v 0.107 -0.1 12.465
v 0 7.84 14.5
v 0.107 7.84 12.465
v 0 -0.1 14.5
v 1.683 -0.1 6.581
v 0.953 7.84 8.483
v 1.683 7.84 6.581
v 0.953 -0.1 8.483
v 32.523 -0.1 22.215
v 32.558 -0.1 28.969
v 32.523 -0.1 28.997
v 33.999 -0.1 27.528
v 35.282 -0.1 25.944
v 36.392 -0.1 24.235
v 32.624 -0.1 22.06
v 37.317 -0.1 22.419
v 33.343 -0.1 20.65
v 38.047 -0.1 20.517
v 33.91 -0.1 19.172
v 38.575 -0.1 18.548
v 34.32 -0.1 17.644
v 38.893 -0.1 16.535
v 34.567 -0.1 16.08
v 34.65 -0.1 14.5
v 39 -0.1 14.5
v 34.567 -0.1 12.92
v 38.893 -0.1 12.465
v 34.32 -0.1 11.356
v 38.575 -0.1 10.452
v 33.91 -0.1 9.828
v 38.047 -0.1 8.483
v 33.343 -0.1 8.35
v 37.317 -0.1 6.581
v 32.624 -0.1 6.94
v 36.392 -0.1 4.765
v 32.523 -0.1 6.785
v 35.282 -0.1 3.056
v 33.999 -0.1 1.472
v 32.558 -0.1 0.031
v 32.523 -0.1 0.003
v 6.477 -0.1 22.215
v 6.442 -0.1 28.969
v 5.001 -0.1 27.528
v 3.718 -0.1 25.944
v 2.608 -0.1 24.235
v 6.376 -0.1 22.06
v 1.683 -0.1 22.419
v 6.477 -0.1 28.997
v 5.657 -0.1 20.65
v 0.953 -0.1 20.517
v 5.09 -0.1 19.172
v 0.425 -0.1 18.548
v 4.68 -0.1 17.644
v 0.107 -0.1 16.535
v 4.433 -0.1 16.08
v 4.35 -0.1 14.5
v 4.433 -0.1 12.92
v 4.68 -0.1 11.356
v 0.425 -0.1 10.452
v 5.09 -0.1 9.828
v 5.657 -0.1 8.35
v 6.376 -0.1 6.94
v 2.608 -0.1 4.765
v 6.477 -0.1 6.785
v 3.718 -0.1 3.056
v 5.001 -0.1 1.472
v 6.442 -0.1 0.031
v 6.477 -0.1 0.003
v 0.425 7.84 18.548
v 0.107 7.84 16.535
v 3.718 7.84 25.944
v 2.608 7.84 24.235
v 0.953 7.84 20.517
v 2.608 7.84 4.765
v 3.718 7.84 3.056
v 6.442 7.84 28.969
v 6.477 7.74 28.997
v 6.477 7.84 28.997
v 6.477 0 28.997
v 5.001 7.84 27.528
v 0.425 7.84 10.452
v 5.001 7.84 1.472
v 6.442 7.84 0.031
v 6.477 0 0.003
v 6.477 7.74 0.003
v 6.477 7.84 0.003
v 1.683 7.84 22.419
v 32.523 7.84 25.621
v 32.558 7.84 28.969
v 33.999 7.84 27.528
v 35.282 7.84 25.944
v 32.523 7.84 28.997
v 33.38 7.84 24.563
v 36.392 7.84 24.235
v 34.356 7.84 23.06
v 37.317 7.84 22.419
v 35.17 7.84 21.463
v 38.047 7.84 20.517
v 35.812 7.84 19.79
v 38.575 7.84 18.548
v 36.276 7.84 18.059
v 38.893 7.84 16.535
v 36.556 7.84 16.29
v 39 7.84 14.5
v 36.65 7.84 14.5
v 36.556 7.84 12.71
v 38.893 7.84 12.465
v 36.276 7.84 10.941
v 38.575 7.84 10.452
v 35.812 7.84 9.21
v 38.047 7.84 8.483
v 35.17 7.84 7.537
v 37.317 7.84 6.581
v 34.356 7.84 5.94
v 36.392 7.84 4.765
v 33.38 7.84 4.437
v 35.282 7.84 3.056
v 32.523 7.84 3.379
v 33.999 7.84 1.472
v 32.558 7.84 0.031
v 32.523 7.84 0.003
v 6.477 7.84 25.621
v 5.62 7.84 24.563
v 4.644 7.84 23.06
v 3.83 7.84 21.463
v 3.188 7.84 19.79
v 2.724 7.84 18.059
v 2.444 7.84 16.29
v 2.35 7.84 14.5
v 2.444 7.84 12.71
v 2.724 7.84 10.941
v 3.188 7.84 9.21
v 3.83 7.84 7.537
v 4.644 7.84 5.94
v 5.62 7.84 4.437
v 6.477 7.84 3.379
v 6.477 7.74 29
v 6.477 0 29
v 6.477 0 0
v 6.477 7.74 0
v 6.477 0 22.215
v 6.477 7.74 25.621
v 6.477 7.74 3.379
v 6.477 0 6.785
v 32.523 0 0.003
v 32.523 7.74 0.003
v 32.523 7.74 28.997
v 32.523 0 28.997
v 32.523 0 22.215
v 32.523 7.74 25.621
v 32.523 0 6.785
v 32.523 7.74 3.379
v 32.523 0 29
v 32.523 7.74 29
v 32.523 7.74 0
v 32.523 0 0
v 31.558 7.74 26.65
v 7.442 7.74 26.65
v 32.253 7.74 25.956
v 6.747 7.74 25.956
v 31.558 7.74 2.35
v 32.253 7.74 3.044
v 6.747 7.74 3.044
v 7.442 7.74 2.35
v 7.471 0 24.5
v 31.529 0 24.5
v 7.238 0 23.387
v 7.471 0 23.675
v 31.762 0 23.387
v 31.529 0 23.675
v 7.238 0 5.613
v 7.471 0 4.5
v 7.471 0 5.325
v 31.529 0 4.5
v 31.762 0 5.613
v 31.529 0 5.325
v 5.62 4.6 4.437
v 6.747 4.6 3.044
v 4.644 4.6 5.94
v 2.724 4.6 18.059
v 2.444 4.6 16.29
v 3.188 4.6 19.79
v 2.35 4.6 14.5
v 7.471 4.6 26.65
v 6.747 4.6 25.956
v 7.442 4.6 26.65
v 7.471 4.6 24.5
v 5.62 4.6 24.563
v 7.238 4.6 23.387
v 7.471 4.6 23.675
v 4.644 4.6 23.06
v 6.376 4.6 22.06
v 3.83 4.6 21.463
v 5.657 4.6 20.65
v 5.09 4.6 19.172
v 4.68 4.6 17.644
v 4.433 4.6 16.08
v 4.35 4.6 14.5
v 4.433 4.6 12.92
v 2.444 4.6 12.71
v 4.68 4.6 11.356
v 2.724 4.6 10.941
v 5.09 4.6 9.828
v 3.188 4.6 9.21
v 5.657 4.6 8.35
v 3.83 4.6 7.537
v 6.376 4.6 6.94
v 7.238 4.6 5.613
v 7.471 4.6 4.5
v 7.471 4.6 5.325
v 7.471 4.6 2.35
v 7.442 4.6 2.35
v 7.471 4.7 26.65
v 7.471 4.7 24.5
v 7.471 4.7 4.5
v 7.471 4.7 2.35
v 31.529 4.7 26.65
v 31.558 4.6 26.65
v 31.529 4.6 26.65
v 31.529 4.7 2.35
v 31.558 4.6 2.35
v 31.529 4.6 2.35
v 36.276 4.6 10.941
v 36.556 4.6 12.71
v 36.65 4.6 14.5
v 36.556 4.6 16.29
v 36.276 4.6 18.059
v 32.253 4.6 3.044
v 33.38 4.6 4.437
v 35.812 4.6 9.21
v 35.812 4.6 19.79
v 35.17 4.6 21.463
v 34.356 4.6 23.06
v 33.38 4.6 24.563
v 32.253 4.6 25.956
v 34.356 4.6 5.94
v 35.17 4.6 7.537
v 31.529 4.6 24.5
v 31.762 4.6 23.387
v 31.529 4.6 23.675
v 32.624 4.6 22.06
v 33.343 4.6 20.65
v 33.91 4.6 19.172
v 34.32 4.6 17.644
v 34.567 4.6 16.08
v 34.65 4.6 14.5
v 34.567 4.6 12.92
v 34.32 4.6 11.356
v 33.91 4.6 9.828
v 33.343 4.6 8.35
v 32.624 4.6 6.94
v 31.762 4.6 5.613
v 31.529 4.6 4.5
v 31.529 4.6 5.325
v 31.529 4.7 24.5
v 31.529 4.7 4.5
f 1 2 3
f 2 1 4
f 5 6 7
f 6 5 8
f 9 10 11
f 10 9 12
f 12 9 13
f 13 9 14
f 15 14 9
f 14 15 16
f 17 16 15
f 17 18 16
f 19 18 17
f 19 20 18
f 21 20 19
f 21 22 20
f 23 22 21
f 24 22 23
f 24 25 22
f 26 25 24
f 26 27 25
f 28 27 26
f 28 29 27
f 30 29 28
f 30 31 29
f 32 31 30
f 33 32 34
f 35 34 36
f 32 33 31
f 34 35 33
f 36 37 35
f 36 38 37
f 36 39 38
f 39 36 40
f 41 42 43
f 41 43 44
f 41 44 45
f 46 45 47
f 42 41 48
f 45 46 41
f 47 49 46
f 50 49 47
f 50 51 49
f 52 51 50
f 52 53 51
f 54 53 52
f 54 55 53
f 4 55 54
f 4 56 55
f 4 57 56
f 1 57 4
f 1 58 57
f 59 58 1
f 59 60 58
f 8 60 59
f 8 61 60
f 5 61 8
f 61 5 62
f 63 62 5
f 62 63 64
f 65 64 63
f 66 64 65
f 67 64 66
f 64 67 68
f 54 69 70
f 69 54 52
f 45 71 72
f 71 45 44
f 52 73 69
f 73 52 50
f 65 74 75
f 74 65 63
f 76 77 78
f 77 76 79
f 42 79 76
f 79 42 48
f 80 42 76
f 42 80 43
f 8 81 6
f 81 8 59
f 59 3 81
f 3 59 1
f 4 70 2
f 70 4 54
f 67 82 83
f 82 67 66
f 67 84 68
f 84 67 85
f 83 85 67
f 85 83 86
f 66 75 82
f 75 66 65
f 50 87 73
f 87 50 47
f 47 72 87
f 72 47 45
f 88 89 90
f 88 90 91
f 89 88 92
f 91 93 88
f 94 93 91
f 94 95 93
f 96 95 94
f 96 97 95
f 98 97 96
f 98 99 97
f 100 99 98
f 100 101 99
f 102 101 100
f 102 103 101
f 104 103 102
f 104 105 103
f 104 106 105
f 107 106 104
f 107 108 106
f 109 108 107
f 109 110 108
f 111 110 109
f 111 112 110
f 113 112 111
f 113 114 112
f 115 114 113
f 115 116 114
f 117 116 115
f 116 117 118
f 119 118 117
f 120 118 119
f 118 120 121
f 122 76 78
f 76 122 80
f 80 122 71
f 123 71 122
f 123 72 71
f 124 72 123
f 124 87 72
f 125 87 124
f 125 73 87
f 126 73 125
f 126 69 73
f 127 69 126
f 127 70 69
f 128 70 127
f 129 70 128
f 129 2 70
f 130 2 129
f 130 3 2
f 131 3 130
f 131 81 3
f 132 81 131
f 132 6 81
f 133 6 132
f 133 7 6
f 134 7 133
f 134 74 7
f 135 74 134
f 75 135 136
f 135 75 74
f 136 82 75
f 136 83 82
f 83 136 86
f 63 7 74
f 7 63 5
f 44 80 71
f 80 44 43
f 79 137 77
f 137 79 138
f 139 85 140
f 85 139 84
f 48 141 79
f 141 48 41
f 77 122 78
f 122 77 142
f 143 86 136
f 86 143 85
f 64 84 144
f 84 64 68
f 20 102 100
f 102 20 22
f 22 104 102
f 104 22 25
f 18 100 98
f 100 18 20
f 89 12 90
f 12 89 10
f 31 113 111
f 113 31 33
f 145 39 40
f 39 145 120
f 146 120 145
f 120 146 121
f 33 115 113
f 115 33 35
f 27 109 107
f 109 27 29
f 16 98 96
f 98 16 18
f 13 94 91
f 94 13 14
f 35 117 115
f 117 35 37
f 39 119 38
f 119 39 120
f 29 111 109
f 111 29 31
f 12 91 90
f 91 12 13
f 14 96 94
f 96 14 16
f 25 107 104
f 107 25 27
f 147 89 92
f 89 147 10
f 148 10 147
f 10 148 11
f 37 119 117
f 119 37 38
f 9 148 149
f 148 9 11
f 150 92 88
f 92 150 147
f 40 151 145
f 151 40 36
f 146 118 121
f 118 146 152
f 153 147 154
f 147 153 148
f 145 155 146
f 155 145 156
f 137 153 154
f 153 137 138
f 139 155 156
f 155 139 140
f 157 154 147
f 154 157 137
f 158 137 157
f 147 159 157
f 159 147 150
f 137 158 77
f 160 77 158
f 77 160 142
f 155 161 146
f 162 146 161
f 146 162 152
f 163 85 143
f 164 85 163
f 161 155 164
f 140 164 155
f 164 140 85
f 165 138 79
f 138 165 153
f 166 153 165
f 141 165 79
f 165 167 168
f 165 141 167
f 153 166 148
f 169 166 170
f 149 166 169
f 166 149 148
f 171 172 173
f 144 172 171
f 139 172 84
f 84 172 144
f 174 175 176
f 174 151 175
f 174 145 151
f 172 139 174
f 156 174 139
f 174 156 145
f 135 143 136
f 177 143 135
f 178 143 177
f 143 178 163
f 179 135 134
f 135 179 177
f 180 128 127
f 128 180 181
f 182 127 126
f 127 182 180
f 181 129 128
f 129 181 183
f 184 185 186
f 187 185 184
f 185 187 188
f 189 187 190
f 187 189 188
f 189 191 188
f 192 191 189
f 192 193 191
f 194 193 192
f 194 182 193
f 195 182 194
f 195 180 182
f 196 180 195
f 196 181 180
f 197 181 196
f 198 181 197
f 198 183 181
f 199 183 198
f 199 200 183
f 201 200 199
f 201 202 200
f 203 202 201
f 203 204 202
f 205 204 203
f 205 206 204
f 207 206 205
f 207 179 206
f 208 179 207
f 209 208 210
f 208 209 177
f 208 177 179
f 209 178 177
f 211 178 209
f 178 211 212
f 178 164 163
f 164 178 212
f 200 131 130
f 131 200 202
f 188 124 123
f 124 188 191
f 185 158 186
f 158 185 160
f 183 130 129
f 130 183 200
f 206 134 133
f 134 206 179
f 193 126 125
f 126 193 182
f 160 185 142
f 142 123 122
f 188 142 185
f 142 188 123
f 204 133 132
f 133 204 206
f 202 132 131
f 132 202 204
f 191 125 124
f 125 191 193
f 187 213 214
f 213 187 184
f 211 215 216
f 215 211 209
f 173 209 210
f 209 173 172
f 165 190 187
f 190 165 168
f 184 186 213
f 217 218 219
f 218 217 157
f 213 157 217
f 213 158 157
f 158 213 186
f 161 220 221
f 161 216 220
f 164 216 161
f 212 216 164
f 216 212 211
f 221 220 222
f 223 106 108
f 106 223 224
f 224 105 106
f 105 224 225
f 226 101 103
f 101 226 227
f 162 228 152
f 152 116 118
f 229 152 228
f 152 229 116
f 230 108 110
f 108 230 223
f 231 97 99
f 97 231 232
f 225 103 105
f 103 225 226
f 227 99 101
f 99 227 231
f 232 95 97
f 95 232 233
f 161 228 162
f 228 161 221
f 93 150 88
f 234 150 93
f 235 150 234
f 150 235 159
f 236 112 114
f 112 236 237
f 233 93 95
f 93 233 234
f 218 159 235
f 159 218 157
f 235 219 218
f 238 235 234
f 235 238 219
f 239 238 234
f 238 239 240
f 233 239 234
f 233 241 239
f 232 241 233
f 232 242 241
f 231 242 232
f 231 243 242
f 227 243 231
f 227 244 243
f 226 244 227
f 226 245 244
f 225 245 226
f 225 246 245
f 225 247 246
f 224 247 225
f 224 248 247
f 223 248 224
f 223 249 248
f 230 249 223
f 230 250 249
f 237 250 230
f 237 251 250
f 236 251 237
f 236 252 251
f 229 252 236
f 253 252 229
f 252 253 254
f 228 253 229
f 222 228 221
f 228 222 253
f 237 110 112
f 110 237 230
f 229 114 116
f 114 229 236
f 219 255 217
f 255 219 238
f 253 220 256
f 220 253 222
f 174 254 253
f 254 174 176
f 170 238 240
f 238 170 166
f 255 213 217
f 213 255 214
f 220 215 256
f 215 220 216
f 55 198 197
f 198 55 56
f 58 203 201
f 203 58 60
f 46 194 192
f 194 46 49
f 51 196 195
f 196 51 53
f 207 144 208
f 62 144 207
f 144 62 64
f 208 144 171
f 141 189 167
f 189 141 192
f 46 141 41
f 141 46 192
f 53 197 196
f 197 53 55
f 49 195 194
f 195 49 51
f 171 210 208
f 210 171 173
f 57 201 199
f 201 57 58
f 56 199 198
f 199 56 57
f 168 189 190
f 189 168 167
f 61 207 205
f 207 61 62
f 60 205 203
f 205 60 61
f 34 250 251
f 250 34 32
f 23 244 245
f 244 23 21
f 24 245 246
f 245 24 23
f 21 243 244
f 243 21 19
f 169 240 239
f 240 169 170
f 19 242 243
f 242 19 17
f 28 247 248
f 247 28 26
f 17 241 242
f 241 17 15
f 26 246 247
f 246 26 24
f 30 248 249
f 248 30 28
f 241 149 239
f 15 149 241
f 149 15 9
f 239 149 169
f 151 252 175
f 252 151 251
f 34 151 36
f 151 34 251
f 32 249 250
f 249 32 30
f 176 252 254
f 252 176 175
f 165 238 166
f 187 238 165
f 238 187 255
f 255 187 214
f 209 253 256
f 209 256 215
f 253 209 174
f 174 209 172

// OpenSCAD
// ============================================================
// Lens frame — combiner-glass holder + tilted mount
//
//   lens_frame(lens, wall, clearance)      the glass-holder shell: a straight
//                          middle section with an arc cap on each end, minus
//                          the glass pocket + see-through window.
//   lens_negatives(lens, wall, clearance)  the pocket + window as negative
//                          solids in frame-local coords; shared by the frame
//                          and the connecting webs so nothing intrudes on the
//                          lens seat.
//   glass_frame_mount(...)  places the frame tilted at `angle`, bridged to the
//                          shroud side walls by two rear-only connecting webs.
//
// lens = [w, h, t, top_r, lip].  Landscape orientation: lens_h (h) along X,
// lens_w (w) along Z; arc caps on the LEFT/RIGHT ends span lens_w.  Glass
// slides in from the +Y (front) face; the −Y side carries the retaining lip.
// ============================================================

// Frame outer dims derived from the lens block + wall (shared with the
// assembly so the same formulas are never duplicated).
function lens_frame_width(lens, wall) = lens[1] + 2 * wall; // arm_w
function lens_frame_depth(lens, wall) = lens[2] + 2 * wall; // frame_y (glass normal)
function lens_frame_height(lens, wall) = lens[0] + 2 * wall; // frame_z (along tilt)

module lens_frame(lens, wall, clearance) {
  lw = lens[0];
  lh = lens[1];
  ltr = lens[3];
  frame_y = lens_frame_depth(lens, wall);
  frame_z = lens_frame_height(lens, wall);

  // inner pocket arc centres (X, Z) in frame local coords
  inner_hc = sqrt(ltr * ltr - (lw / 2) * (lw / 2)); // half-chord spanning Z = lens_w
  p_lcx = wall + ltr;
  p_rcx = wall + lh - ltr;
  p_cz = wall + lw / 2;

  // inner straight-section X bounds (arc tangent to Z=wall / Z=wall+lens_w)
  inner_lx = p_lcx - inner_hc;
  inner_rx = p_rcx + inner_hc;

  // outer shell (R_outer = lens_top_r + wall)
  R_outer = ltr + wall;
  outer_hc = sqrt(R_outer * R_outer - (frame_z / 2) * (frame_z / 2));
  outer_lx = p_lcx - outer_hc;
  outer_rx = p_rcx + outer_hc;

  difference() {
    // ── outer shell ───────────────────────────────────────────
    union() {
      // straight middle section
      translate([outer_lx, 0, 0])
        cube([outer_rx - outer_lx, frame_y, frame_z]);

      // left arc cap (X < outer_lx)
      intersection() {
        translate([p_lcx, frame_y / 2, p_cz])
          rotate([90, 0, 0])
            cylinder(r=R_outer, h=frame_y + 0.2, center=true, $fn=60);
        translate([-(R_outer + 1), -0.1, -0.1])
          cube([R_outer + 1 + outer_lx, frame_y + 0.2, frame_z + 0.2]);
      }

      // right arc cap (X > outer_rx)
      intersection() {
        translate([p_rcx, frame_y / 2, p_cz])
          rotate([90, 0, 0])
            cylinder(r=R_outer, h=frame_y + 0.2, center=true, $fn=60);
        translate([outer_rx, -0.1, -0.1])
          cube([R_outer + 1, frame_y + 0.2, frame_z + 0.2]);
      }
    }

    // Glass pocket + see-through window cavities (shared with the side webs).
    lens_negatives(lens, wall, clearance);
  }
}

// The glass pocket (opens at +Y) and the see-through window, as a set of
// negative solids in lens_frame local coords.  Cut from the frame AND from
// the connecting webs so nothing intrudes into the lens seat.
module lens_negatives(lens, wall, clearance) {
  lens_pocket(lens, wall, clearance);
  lens_window(lens, wall, clearance);
}

// The glass pocket alone — the stadium prism the lens actually occupies, open
// at the +Y face.  Split out from lens_negatives() so the insertion channel
// can sweep it without dragging the see-through window along.
module lens_pocket(lens, wall, clearance) {
  lw = lens[0];
  lh = lens[1];
  lt = lens[2];
  ltr = lens[3];
  frame_y = lens_frame_depth(lens, wall);

  inner_hc = sqrt(ltr * ltr - (lw / 2) * (lw / 2));
  p_lcx = wall + ltr;
  p_rcx = wall + lh - ltr;
  p_cz = wall + lw / 2;
  p_r = ltr + clearance / 2;
  inner_lx = p_lcx - inner_hc;
  inner_rx = p_rcx + inner_hc;

  // Glass enters from the FRONT (+Y) face; retaining lip on the -Y side.
  pkt = lt + clearance;
  pky = frame_y - pkt;

  // The glass's 24 mm dimension needs slack too.  The thickness and the end
  // arcs already carry `clearance`; without the same on the height the pocket
  // is exactly the glass's size, and a printed one comes out undersize — the
  // optic will not go in.  Costs clearance/2 off the frame's top/bottom rim.
  pz0 = wall - clearance / 2;
  pzh = lw + clearance;

  // ── glass pocket: straight section ────────────────────────
  translate([inner_lx, pky, pz0])
    cube([inner_rx - inner_lx, pkt + 0.1, pzh]);

  // ── glass pocket: left arc cap ────────────────────────────
  intersection() {
    translate([p_lcx, frame_y - pkt / 2, p_cz])
      rotate([90, 0, 0])
        cylinder(r=p_r, h=pkt + 0.2, center=true, $fn=60);
    translate([-(p_r + 1), -0.1, pz0])
      cube([p_r + 1 + inner_lx, frame_y + 0.2, pzh]);
  }

  // ── glass pocket: right arc cap ───────────────────────────
  intersection() {
    translate([p_rcx, frame_y - pkt / 2, p_cz])
      rotate([90, 0, 0])
        cylinder(r=p_r, h=pkt + 0.2, center=true, $fn=60);
    translate([inner_rx, -0.1, pz0])
      cube([p_r + 1, frame_y + 0.2, pzh]);
  }

}

// The see-through window alone — open through BOTH faces, inset by the lens's
// `lip` so a rim laps the glass on each side.
module lens_window(lens, wall, clearance) {
  lw = lens[0];
  lh = lens[1];
  lt = lens[2];
  ltr = lens[3];
  llip = lens[4];
  frame_y = lens_frame_depth(lens, wall);

  inner_hc = sqrt(ltr * ltr - (lw / 2) * (lw / 2));
  p_lcx = wall + ltr;
  p_rcx = wall + lh - ltr;
  p_cz = wall + lw / 2;
  p_r = ltr + clearance / 2;
  inner_lx = p_lcx - inner_hc;
  inner_rx = p_rcx + inner_hc;

  // ── see-through window — open through BOTH faces ──────────
  wr = p_r - llip; // inset arc radius for the window
  translate([inner_lx, -0.1, wall + llip])
    cube([inner_rx - inner_lx, frame_y + 0.2, lw - 2 * llip]);
  intersection() {
    translate([p_lcx, frame_y / 2, p_cz])
      rotate([90, 0, 0]) cylinder(r=wr, h=frame_y + 0.2, center=true, $fn=60);
    translate([-(wr + 1), -0.1, wall + llip])
      cube([wr + 1 + inner_lx, frame_y + 0.2, lw - 2 * llip]);
  }
  intersection() {
    translate([p_rcx, frame_y / 2, p_cz])
      rotate([90, 0, 0]) cylinder(r=wr, h=frame_y + 0.2, center=true, $fn=60);
    translate([inner_rx, -0.1, wall + llip])
      cube([wr + 1, frame_y + 0.2, lw - 2 * llip]);
  }
}

// ── Glass seat clearance + front insertion channel ───────────
// In ASSEMBLY coordinates (not frame-local): the lens seat, plus the pocket
// swept straight out the FRONT (+Y), so the glass can be pushed in
// horizontally through the front aperture instead of having to be threaded in
// along its own tilted normal.
//
// Subtract this from the WHOLE top part, not just the frame.  The frame is
// deliberately parked 0.5 mm behind body_d, which puts the seat's mouth inside
// the shroud's front lip — cutting only the frame and its webs leaves the lip
// standing in the pocket, and the glass cannot seat at all, let alone slide in.
// The channel notches the lip's upper half across the lens width; the lip's
// lower half runs wall to wall untouched.
//
// The sweep is horizontal, so gravity acts square across the channel and
// cannot walk the glass back out of it; adhesive on the rim does the rest.
//   travel : how far forward to sweep.  Needs to carry the pocket's REARMOST
//            corner past the front face; the default clears body_d for the
//            stock geometry.
//   inset  : this cutter re-cuts the pocket and window where lens_frame() has
//            ALREADY cut them — it has to, because it is subtracted from the
//            whole part and the shroud's lip is not the frame.  Cut for cut,
//            the two boundaries land on the same surfaces, and CGAL resolves
//            that tie into duplicate coincident facets: a non-manifold mesh
//            out of a perfectly valid solid.  Pulling this copy `inset` mm
//            SMALLER keeps it strictly inside the frame's own cut, so the
//            frame alone defines the pocket surface and the tie never
//            happens.  The direction matters: larger instead of smaller
//            re-introduces the tie against the frame's outer shell.  What it
//            costs is the insertion channel running 0.28 mm clear of the
//            glass instead of 0.30 — no lip is added, nothing is tightened
//            where the optic actually seats.
module glass_seat_clear(lens, wall, clearance, body_w, glass_cy, glass_cz,
                        angle, travel = 25, inset = 0.02) {
  clear = clearance - inset;
  arm_w = lens_frame_width(lens, wall);
  frame_y = lens_frame_depth(lens, wall);
  frame_z = lens_frame_height(lens, wall);

  module _seat_local() {
    translate([body_w / 2, glass_cy, glass_cz])
      rotate([90 - angle, 0, 0])
        translate([-arm_w / 2, -frame_y / 2, -frame_z / 2])
          children();
  }

  // The seat itself (pocket + window), so nothing outside the frame intrudes.
  _seat_local() lens_negatives(lens, wall, clear);

  // Insertion channel: the pocket swept forward.  The pocket is a convex
  // stadium prism, so hull() of the two ends is exactly the swept volume.
  hull() {
    _seat_local() lens_pocket(lens, wall, clear);
    translate([0, travel, 0])
      _seat_local() lens_pocket(lens, wall, clear);
  }
}

// ── Glass frame at angle ─────────────────────────────────────
// The lens_frame is centred in X; connecting webs bridge from each shroud
// side wall to the frame's rounded ends, running the FULL height of the
// frame (web_hz = frame_z/2) so the wing reaches from the frame's top edge
// down to its bottom edge — previously web_hz was a thin central band,
// leaving the frame's lower half floating unsupported inside the shroud
// opening.  (The side walls themselves are already solid full-height blocks
// — see eotech_shroud — so what was missing was the visible wing/mullion
// inside the window opening, not extra material buried in the wall.)  Webs
// only occupy the solid depth BEHIND the glass pocket (the −Y half), so they
// never enter the clear window.
//
// Because the web follows the frame's own tilt (its local Z axis), its
// bottom edge sits a few mm above the true world floor even at full height —
// a pair of small, genuinely-vertical (world-Z) columns close that last gap,
// planted in the open span between the wall and the frame's edge (NOT inside
// the wall itself, which is already solid — a column there would be buried
// in existing material and invisible/structurally moot).
module glass_frame_mount(
  lens,
  wall,
  clearance,
  body_w,
  side_edge,
  glass_cy,
  glass_cz,
  angle,
  base_z,
  arm_overlap = 3.0
) {
  lt = lens[2];
  arm_w = lens_frame_width(lens, wall);
  frame_y = lens_frame_depth(lens, wall);
  frame_z = lens_frame_height(lens, wall);

  web_hz = frame_z / 2; // half-height of the connecting web (Z band) — full frame height
  web_dy = frame_y - (lt + clearance); // depth behind the pocket
  web_y0 = -frame_y / 2; // rear (-Y) face of the frame
  theta = 90 - angle; // frame tilt from vertical (matches the rotate below)

  // World Y/Z of two points just inside the web's solid near its bottom edge
  // (local Z nudged up from -web_hz) and inset from each Y end (local Y
  // nudged in from web_y0 / web_y0+web_dy) — both axes nudged so hull()'s
  // tapered apex lands strictly inside real solid rather than merely
  // touching a boundary face (a zero-volume "kiss" that CGAL keeps as a
  // separate shell instead of fusing into the union).
  ly_in1 = web_y0 + 0.5;
  ly_in2 = web_y0 + web_dy - 0.5;
  lz_anchor = -web_hz + 0.5;
  col_y1 = glass_cy + ly_in1 * cos(theta) - lz_anchor * sin(theta);
  col_z1 = glass_cz + ly_in1 * sin(theta) + lz_anchor * cos(theta);
  col_y2 = glass_cy + ly_in2 * cos(theta) - lz_anchor * sin(theta);
  col_z2 = glass_cz + ly_in2 * sin(theta) + lz_anchor * cos(theta);
  col_pad = 2; // floor footprint padding beyond the anchor points, each side
  col_w = 8; // column width — small, just enough to print solid

  translate([body_w / 2, glass_cy, glass_cz])
    rotate([90 - angle, 0, 0]) {
      translate([-arm_w / 2, -frame_y / 2, -frame_z / 2])
        lens_frame(lens, wall, clearance);

      // Connecting webs — pocket/window cavities re-cut as a safeguard.
      difference() {
        union() {
          // Left web: frame end (overlapping arm_overlap into the arc) → wall
          hull() {
            translate([-arm_w / 2 - 0.1, web_y0, -web_hz])
              cube([arm_overlap + 0.1, web_dy, 2 * web_hz]);
            translate([-body_w / 2, web_y0, -web_hz])
              cube([side_edge, web_dy, 2 * web_hz]);
          }
          // Right web: frame end → wall
          hull() {
            translate([arm_w / 2 - arm_overlap, web_y0, -web_hz])
              cube([arm_overlap + 0.1, web_dy, 2 * web_hz]);
            translate([body_w / 2 - side_edge, web_y0, -web_hz])
              cube([side_edge, web_dy, 2 * web_hz]);
          }
        }
        translate([-arm_w / 2, -frame_y / 2, -frame_z / 2])
          lens_negatives(lens, wall, clearance);
      }
    }

  // Small plumb columns, left and right, closing the last gap between the
  // web's (tilted) underside and the true world floor — hulled from the
  // web's two true anchor corners down to a padded footprint on the floor.
  if (col_z1 > base_z || col_z2 > base_z) {
    // The columns reach under the frame's ends, where the glass pocket also
    // lives, so they get the same cavities cut from them as the webs do —
    // otherwise they clip the glass's lower corners and it cannot seat.
    difference() {
      for (x0 = [side_edge, body_w - side_edge - col_w]) {
        hull() {
          translate([x0, col_y1, col_z1]) cube([col_w, 0.1, 3]);
          translate([x0, col_y2, col_z2]) cube([col_w, 0.1, 3]);
          translate([x0, min(col_y1, col_y2) - col_pad, base_z])
            cube([col_w, abs(col_y2 - col_y1) + 2 * col_pad, 0.1]);
        }
      }
      translate([body_w / 2, glass_cy, glass_cz])
        rotate([90 - angle, 0, 0])
          translate([-arm_w / 2, -frame_y / 2, -frame_z / 2])
            lens_negatives(lens, wall, clearance);
    }
  }
}

// ── Demo (renders only when this file is opened directly) ────
$fn = 48;
_lens = [24.00, 34.00, 2.74, 16.97, 2.00];
lens_frame(_lens, 2.50, 0.30);
